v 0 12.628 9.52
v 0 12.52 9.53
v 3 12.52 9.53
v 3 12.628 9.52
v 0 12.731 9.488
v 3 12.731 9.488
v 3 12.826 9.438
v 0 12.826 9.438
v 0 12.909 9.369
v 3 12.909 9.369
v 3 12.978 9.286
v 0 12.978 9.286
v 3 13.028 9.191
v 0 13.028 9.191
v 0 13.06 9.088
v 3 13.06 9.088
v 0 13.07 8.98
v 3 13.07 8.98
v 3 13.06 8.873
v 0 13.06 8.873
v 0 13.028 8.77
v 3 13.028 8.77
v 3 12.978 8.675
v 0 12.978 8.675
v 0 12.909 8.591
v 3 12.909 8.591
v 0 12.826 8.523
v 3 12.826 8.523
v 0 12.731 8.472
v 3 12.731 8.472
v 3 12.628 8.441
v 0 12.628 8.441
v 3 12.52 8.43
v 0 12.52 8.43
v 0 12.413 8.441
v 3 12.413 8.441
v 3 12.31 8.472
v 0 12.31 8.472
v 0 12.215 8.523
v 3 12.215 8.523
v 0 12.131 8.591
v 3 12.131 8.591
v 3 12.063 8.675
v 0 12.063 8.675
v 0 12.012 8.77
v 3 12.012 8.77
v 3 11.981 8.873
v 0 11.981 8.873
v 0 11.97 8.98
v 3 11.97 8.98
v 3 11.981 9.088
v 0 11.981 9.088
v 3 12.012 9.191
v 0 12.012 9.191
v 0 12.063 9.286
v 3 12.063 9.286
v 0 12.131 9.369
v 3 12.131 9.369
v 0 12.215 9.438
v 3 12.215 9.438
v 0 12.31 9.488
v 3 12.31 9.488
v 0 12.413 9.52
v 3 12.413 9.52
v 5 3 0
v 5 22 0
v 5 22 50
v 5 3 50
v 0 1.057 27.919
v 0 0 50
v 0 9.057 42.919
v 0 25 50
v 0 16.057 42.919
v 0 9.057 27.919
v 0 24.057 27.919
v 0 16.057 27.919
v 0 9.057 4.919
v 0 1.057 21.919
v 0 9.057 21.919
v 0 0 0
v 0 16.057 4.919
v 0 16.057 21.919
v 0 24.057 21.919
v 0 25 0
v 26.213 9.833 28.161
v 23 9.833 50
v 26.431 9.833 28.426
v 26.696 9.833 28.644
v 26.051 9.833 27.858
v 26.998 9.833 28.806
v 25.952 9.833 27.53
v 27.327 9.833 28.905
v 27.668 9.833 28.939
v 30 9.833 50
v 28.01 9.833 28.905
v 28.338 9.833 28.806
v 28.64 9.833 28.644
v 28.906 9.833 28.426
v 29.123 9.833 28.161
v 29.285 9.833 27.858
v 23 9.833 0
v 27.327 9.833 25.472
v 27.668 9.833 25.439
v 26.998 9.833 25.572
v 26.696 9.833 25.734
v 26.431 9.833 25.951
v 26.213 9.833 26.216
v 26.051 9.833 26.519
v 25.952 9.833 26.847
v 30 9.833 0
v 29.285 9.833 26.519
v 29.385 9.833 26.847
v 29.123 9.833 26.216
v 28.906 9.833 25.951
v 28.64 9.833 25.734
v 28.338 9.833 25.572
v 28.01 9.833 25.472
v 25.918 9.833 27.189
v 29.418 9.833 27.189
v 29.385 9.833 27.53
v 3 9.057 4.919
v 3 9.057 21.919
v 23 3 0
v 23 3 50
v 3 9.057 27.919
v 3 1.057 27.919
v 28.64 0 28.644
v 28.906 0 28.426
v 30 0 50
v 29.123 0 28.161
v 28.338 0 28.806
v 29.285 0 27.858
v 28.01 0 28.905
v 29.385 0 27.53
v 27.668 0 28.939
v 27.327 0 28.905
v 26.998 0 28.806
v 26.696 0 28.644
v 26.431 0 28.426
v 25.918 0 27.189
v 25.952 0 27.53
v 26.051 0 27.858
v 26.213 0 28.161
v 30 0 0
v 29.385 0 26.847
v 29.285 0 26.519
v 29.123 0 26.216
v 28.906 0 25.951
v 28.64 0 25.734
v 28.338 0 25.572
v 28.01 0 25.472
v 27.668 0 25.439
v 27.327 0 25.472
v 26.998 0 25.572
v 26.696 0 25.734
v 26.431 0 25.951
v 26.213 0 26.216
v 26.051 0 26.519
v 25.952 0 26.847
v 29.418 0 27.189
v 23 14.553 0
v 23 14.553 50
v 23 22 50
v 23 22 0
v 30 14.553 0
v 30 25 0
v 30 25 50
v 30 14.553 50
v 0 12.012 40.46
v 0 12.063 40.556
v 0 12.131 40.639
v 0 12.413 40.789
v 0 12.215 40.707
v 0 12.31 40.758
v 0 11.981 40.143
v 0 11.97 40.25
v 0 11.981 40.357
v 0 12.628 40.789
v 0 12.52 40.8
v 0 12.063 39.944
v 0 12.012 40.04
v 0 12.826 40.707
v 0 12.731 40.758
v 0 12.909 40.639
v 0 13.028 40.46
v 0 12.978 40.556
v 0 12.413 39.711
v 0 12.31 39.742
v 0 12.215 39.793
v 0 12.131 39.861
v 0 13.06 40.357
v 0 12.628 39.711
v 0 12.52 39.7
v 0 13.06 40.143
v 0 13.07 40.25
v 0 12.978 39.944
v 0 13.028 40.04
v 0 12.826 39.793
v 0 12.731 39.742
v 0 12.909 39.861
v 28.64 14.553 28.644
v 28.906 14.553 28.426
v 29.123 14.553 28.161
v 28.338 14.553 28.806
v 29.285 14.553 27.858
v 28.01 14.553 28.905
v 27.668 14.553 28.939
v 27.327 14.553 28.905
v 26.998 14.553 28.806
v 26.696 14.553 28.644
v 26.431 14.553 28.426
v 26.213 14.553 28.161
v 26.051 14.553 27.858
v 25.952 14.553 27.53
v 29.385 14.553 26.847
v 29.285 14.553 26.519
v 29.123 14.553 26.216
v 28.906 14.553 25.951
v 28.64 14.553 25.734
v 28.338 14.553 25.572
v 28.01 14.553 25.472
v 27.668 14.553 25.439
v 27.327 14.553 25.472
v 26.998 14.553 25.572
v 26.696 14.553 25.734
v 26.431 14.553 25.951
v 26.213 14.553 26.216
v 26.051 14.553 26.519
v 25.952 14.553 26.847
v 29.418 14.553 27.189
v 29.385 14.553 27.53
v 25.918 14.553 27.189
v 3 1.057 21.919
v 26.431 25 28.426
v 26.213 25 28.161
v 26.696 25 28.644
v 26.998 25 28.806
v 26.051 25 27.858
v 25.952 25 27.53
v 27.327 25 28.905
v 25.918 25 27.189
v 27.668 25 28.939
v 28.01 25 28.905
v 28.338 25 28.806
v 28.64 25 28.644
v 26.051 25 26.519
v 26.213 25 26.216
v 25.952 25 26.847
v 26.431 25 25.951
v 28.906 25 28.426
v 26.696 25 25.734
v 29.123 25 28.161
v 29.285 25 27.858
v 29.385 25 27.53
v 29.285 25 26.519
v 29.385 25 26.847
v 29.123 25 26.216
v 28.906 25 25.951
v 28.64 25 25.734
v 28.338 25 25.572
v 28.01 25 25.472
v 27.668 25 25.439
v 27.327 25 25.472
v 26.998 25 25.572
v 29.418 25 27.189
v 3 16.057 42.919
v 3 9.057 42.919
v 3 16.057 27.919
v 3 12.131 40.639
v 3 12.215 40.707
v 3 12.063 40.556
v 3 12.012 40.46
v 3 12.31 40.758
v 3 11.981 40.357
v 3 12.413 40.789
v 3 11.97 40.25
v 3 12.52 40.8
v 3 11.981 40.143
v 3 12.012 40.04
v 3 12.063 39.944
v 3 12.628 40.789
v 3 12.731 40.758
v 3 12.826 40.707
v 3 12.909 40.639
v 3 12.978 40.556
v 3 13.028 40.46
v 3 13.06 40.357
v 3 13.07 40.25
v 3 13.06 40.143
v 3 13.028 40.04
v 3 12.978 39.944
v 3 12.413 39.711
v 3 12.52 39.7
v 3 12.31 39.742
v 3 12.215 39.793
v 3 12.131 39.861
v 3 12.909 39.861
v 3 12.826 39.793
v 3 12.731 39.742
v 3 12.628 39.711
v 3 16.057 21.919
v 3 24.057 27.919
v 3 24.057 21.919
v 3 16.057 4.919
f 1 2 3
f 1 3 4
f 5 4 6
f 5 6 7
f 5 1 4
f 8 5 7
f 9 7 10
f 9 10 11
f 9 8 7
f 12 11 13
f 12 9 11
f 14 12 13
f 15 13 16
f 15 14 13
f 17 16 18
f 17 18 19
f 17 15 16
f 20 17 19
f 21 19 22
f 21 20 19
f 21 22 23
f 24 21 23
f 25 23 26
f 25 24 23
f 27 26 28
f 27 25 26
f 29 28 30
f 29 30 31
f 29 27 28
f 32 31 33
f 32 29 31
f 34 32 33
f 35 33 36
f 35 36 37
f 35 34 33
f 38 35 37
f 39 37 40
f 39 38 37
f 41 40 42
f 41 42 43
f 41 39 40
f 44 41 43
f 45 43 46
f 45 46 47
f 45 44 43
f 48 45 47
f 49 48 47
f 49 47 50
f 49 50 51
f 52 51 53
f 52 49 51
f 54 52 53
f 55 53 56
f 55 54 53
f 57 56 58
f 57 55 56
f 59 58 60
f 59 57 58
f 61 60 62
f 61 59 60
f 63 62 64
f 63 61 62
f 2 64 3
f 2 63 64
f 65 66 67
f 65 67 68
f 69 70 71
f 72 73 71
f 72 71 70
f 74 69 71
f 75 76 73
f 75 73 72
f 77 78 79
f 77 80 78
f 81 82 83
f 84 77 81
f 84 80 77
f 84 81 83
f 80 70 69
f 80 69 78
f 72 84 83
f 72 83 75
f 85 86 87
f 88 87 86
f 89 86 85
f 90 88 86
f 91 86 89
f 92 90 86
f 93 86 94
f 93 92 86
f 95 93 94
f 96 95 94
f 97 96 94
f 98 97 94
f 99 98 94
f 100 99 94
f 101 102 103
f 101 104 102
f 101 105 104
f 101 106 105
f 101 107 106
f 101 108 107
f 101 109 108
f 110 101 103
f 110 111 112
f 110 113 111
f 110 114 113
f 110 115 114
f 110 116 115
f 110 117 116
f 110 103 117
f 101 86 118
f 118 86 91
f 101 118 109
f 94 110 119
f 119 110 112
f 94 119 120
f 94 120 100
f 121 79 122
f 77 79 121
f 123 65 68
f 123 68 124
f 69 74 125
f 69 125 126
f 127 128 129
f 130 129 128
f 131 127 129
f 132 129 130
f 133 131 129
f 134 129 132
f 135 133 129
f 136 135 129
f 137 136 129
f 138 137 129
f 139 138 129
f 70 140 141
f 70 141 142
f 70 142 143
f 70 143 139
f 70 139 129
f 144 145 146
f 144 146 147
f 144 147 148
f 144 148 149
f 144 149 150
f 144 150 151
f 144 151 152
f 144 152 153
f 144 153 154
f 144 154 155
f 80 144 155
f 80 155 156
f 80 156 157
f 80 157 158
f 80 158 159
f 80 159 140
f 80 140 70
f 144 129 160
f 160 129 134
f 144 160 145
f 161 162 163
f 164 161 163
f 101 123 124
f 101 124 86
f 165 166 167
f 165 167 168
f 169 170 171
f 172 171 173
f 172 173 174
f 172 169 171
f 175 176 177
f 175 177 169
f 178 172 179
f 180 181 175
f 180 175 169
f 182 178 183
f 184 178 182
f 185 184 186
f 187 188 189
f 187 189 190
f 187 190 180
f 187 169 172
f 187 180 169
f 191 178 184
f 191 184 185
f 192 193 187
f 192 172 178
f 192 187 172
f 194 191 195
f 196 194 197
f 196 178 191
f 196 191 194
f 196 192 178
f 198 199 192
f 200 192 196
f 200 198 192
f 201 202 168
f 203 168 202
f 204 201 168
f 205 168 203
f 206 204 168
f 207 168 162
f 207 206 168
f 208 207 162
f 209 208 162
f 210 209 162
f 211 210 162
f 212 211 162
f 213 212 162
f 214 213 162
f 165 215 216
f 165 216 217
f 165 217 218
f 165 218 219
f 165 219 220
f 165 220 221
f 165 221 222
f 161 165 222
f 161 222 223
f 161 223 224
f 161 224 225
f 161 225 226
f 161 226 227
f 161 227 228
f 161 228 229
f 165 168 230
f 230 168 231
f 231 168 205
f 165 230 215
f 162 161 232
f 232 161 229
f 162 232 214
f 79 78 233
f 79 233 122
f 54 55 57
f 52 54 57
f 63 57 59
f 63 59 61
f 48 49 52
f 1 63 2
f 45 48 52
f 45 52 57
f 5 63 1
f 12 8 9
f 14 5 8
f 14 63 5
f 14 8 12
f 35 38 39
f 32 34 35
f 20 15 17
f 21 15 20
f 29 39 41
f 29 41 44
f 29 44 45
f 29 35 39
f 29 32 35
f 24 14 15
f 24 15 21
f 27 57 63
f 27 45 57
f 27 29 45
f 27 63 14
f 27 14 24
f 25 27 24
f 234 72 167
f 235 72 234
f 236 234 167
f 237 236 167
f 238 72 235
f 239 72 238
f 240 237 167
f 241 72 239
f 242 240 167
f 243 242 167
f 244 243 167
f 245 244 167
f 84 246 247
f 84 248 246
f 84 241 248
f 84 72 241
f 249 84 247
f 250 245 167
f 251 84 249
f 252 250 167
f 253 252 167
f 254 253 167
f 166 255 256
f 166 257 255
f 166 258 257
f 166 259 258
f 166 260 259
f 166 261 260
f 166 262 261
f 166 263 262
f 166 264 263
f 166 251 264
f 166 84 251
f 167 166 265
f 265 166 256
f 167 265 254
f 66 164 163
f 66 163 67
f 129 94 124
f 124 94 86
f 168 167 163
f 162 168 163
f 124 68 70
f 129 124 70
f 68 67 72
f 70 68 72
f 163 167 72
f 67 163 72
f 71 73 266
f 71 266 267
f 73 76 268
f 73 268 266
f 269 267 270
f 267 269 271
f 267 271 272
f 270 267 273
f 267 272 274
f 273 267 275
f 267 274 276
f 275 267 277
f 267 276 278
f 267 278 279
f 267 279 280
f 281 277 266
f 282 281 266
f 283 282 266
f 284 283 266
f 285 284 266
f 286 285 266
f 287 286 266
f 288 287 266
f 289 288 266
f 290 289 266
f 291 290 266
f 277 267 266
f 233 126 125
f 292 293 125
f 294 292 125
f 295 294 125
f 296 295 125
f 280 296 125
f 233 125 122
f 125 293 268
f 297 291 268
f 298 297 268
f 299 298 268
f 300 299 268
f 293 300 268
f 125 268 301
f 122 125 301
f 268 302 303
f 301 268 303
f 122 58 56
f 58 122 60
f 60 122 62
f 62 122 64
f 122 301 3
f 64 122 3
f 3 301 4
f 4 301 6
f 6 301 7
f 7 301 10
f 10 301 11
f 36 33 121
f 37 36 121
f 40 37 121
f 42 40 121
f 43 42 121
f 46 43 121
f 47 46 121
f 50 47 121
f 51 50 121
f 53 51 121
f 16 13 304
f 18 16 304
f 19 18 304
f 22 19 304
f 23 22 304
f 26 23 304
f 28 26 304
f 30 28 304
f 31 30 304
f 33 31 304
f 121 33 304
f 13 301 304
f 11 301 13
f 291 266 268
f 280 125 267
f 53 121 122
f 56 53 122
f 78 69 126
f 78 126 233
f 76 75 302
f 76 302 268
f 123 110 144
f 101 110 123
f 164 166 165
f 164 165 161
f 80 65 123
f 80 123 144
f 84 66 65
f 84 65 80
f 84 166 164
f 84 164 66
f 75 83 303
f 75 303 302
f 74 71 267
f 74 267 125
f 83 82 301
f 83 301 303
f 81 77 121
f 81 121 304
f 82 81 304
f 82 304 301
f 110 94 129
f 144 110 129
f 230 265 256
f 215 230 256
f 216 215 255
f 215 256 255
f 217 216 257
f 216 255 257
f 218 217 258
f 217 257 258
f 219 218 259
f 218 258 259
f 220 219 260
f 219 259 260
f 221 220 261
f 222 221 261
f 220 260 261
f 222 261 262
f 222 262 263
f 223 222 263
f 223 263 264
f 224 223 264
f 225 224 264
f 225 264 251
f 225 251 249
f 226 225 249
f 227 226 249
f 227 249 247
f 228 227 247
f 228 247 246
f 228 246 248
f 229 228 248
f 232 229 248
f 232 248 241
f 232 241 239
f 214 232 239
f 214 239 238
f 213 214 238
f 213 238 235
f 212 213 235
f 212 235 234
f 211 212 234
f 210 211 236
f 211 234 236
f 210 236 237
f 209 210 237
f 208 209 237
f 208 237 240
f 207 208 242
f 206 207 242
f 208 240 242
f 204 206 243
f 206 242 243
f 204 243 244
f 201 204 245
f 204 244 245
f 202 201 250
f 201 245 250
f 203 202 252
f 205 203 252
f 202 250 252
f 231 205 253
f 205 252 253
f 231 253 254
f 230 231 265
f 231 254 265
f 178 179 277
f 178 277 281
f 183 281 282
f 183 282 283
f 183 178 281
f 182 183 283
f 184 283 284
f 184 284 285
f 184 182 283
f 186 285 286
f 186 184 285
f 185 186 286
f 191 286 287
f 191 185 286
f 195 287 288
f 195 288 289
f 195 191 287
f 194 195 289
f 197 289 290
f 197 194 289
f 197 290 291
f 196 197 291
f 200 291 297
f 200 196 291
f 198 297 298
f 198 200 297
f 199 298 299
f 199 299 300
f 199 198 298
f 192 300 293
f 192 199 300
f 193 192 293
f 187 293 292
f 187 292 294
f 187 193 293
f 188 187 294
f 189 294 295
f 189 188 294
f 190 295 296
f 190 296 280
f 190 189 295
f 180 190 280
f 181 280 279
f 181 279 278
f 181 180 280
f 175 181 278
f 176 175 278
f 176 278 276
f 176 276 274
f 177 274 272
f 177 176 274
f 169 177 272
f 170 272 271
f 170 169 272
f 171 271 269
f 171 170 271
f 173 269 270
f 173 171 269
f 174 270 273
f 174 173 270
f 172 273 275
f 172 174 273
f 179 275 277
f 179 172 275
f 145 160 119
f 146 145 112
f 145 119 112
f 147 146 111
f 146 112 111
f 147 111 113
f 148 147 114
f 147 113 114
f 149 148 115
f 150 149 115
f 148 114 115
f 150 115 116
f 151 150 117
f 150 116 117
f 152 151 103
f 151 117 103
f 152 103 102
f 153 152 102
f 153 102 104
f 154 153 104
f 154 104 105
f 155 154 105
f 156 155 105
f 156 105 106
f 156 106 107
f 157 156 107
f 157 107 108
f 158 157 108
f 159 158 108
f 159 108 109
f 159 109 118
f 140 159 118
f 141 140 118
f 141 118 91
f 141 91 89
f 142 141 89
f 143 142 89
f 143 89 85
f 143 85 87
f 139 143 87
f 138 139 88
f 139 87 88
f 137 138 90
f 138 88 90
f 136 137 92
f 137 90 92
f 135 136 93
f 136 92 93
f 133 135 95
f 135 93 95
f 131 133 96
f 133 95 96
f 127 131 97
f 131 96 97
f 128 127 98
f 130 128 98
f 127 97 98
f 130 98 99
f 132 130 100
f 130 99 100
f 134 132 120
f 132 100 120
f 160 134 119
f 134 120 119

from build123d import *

# Parameters (mm, degrees)
BOSS_EXTRUDE1_DEPTH = 50
SKETCH3_R           = 0.55
CUT_EXTRUDE1_DEPTH  = 3
SKETCH4_R           = 1.75
CUT_EXTRUDE2_DEPTH  = 26


with BuildPart() as part:
    # Sketch1 → Boss-Extrude1 (new body)
    with BuildSketch(Plane.XY):
        Polygon((0, 0), (0, 25), (30, 25), (30, 14.553417219), (23, 14.553417219), (23, 22), (5, 22), (5, 3), (23, 3), (23, 9.833225485), (30, 9.833225485), (30, 0), align=None)
    extrude(amount=BOSS_EXTRUDE1_DEPTH)

    # Sketch3 → Cut-Extrude1 (cut)
    with BuildSketch(Plane.ZY):
        Polygon((4.919472148, 16.056705519), (21.919472148, 16.056705519), (21.919472148, 24.056705519), (27.919472148, 24.056705519), (27.919472148, 16.056705519), (42.919472148, 16.056705519), (42.919472148, 9.056705519), (27.919472148, 9.056705519), (27.919472148, 1.056705519), (21.919472148, 1.056705519), (21.919472148, 9.056705519), (4.919472148, 9.056705519), align=None)
        with Locations((40.25, 12.520312642)):
            Circle(SKETCH3_R, mode=Mode.SUBTRACT)
        with Locations((8.980224058, 12.520312642)):
            Circle(SKETCH3_R, mode=Mode.SUBTRACT)
    extrude(amount=-CUT_EXTRUDE1_DEPTH, mode=Mode.SUBTRACT)

    # Sketch4 → Cut-Extrude2 (cut)
    with BuildSketch(Plane(origin=(0, 25, 0), x_dir=(1, 0, 0), z_dir=(0, 1, 0))):
        with Locations((27.668171427, -27.18874166)):
            Circle(SKETCH4_R)
    extrude(amount=-CUT_EXTRUDE2_DEPTH, mode=Mode.SUBTRACT)


solid = part.part
